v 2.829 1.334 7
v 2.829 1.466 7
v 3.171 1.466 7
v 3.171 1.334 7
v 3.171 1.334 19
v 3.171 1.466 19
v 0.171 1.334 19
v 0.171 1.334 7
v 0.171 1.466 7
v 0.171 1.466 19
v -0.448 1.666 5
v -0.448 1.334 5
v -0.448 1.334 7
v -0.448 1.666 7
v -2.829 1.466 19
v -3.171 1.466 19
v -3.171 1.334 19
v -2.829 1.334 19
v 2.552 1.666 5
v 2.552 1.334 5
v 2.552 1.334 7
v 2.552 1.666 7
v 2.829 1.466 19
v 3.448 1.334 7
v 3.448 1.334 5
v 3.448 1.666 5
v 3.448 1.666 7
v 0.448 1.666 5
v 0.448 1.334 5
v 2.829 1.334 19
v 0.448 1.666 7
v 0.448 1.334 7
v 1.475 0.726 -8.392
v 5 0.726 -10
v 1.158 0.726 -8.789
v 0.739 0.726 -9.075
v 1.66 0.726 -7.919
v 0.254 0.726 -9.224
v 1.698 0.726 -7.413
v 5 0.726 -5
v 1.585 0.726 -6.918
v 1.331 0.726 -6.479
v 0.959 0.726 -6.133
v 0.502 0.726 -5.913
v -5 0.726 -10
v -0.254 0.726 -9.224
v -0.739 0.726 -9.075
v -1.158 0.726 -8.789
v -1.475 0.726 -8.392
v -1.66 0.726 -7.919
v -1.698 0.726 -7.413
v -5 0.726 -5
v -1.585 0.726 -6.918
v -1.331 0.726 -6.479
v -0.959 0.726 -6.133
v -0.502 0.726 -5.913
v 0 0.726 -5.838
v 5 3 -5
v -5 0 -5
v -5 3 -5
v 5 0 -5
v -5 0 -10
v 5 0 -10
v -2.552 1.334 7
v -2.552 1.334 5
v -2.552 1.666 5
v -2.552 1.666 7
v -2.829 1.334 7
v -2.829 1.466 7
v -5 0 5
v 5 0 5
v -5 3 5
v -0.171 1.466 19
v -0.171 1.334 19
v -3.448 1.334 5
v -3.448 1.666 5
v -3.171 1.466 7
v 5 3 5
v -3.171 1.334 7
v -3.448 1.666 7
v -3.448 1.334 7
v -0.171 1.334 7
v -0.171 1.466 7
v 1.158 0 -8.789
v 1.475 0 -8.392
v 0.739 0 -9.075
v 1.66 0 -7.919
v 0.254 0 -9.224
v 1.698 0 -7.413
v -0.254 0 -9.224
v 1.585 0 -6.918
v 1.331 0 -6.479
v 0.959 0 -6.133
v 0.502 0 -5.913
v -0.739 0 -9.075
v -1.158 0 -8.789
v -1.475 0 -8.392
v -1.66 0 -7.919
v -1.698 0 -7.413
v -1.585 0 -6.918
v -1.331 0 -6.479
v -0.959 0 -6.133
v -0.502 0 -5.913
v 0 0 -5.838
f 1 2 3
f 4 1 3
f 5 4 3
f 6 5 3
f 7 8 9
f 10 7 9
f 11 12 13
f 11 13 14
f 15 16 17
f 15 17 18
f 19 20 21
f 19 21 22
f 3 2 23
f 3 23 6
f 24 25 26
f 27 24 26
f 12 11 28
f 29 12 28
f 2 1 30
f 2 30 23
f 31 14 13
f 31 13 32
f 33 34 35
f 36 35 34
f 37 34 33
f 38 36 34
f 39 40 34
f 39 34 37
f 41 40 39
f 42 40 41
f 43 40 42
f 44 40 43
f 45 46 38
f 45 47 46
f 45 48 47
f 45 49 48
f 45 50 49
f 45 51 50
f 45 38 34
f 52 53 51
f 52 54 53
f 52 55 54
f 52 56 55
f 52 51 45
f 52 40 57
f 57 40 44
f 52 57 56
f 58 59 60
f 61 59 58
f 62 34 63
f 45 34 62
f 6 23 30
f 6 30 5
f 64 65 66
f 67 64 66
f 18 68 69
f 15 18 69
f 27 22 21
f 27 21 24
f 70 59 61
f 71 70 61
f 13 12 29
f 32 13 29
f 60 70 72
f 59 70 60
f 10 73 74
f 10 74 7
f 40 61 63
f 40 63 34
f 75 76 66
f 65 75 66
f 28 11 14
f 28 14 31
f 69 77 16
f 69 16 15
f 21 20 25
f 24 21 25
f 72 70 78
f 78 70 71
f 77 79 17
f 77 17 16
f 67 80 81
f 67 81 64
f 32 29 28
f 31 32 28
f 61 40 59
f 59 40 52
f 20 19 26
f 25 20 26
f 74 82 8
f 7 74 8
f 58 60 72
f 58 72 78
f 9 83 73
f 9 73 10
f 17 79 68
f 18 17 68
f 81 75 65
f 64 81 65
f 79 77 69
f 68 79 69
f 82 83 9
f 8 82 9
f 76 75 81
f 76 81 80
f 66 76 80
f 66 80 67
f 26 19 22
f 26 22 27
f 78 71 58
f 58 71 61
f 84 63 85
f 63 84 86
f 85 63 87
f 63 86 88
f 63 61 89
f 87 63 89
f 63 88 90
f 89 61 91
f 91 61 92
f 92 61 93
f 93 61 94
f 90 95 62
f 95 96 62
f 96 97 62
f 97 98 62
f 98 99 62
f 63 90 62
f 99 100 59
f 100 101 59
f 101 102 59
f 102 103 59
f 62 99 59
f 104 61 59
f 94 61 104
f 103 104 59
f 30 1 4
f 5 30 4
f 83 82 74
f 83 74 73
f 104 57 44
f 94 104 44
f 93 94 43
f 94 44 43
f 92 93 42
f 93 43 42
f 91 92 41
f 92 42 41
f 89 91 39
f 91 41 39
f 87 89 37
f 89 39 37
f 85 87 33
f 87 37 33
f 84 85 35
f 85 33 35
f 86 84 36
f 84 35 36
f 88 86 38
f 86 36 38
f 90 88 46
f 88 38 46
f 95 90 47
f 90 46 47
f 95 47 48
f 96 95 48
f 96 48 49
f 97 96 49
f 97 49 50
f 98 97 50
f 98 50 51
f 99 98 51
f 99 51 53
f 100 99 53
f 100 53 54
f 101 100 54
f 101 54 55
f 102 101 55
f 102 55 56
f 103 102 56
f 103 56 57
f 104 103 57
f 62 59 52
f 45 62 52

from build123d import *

# Parameters (mm, degrees)
SKETCH1_W             = 10
SKETCH1_H             = 10
BOSS_EXTRUDE1_DEPTH   = 3
SKETCH2_W             = 10
SKETCH2_H             = 0.72584538
BOSS_EXTRUDE2_DEPTH   = 5
SKETCH3_W             = 0.89695156
SKETCH3_H             = 0.331017838
BOSS_EXTRUDE3_DEPTH   = 2
BOSS_EXTRUDE3_2_DEPTH = 2
BOSS_EXTRUDE3_3_DEPTH = 2
SKETCH4_W             = 0.341066666
SKETCH4_H             = 0.131155903
BOSS_EXTRUDE4_DEPTH   = 12
BOSS_EXTRUDE4_2_DEPTH = 12
BOSS_EXTRUDE4_3_DEPTH = 12
SKETCH5_R             = 1.702796859
CUT_EXTRUDE1_DEPTH    = 12


with BuildPart() as part:
    # Sketch1 → Boss-Extrude1 (new body)
    with BuildSketch(Plane(origin=(0, 0, 0), x_dir=(1, 0, 0), z_dir=(0, 1, 0))):
        Rectangle(SKETCH1_W, SKETCH1_H)
    extrude(amount=BOSS_EXTRUDE1_DEPTH)


with BuildPart() as body_2:
    # Sketch2 → Boss-Extrude2 (new body)
    with BuildSketch(Plane(origin=(0, 0, -5), x_dir=(-1, 0, 0), z_dir=(0, 0, -1))):
        with Locations((0, 0.36292269)):
            Rectangle(SKETCH2_W, SKETCH2_H)
    extrude(amount=BOSS_EXTRUDE2_DEPTH)

    # Sketch5 → Cut-Extrude1 (cut)
    with BuildSketch(Plane(origin=(0, 0.72584538, 0), x_dir=(1, 0, 0), z_dir=(0, 1, 0))):
        with Locations(Location((0, 7.540381198, 0), (0, 0, 270))):
            Circle(SKETCH5_R)
    extrude(amount=-CUT_EXTRUDE1_DEPTH, mode=Mode.SUBTRACT)


with BuildPart() as body_3:
    # Sketch3 → Boss-Extrude3 (new body)
    with BuildSketch(Plane.XY.offset(5)):
        with Locations((3, 1.5)):
            Rectangle(SKETCH3_W, SKETCH3_H)
    extrude(amount=BOSS_EXTRUDE3_DEPTH)


with BuildPart() as body_4:
    # Sketch3 → Boss-Extrude3 2 (new body)
    with BuildSketch(Plane.XY.offset(5)):
        with Locations((0, 1.5)):
            Rectangle(SKETCH3_W, SKETCH3_H)
    extrude(amount=BOSS_EXTRUDE3_2_DEPTH)


with BuildPart() as body_5:
    # Sketch3 → Boss-Extrude3 3 (new body)
    with BuildSketch(Plane.XY.offset(5)):
        with Locations((-3, 1.5)):
            Rectangle(SKETCH3_W, SKETCH3_H)
    extrude(amount=BOSS_EXTRUDE3_3_DEPTH)


with BuildPart() as body_6:
    # Sketch4 → Boss-Extrude4 (new body)
    with BuildSketch(Plane.XY.offset(7)):
        with Locations((-3, 1.400069033)):
            Rectangle(SKETCH4_W, SKETCH4_H)
    extrude(amount=BOSS_EXTRUDE4_DEPTH)


with BuildPart() as body_7:
    # Sketch4 → Boss-Extrude4 2 (new body)
    with BuildSketch(Plane.XY.offset(7)):
        with Locations((0, 1.400069033)):
            Rectangle(SKETCH4_W, SKETCH4_H)
    extrude(amount=BOSS_EXTRUDE4_2_DEPTH)


with BuildPart() as body_8:
    # Sketch4 → Boss-Extrude4 3 (new body)
    with BuildSketch(Plane.XY.offset(7)):
        with Locations((3, 1.400069033)):
            Rectangle(SKETCH4_W, SKETCH4_H)
    extrude(amount=BOSS_EXTRUDE4_3_DEPTH)


solid = Compound([part.part, body_2.part, body_3.part, body_4.part, body_5.part, body_6.part, body_7.part, body_8.part])
